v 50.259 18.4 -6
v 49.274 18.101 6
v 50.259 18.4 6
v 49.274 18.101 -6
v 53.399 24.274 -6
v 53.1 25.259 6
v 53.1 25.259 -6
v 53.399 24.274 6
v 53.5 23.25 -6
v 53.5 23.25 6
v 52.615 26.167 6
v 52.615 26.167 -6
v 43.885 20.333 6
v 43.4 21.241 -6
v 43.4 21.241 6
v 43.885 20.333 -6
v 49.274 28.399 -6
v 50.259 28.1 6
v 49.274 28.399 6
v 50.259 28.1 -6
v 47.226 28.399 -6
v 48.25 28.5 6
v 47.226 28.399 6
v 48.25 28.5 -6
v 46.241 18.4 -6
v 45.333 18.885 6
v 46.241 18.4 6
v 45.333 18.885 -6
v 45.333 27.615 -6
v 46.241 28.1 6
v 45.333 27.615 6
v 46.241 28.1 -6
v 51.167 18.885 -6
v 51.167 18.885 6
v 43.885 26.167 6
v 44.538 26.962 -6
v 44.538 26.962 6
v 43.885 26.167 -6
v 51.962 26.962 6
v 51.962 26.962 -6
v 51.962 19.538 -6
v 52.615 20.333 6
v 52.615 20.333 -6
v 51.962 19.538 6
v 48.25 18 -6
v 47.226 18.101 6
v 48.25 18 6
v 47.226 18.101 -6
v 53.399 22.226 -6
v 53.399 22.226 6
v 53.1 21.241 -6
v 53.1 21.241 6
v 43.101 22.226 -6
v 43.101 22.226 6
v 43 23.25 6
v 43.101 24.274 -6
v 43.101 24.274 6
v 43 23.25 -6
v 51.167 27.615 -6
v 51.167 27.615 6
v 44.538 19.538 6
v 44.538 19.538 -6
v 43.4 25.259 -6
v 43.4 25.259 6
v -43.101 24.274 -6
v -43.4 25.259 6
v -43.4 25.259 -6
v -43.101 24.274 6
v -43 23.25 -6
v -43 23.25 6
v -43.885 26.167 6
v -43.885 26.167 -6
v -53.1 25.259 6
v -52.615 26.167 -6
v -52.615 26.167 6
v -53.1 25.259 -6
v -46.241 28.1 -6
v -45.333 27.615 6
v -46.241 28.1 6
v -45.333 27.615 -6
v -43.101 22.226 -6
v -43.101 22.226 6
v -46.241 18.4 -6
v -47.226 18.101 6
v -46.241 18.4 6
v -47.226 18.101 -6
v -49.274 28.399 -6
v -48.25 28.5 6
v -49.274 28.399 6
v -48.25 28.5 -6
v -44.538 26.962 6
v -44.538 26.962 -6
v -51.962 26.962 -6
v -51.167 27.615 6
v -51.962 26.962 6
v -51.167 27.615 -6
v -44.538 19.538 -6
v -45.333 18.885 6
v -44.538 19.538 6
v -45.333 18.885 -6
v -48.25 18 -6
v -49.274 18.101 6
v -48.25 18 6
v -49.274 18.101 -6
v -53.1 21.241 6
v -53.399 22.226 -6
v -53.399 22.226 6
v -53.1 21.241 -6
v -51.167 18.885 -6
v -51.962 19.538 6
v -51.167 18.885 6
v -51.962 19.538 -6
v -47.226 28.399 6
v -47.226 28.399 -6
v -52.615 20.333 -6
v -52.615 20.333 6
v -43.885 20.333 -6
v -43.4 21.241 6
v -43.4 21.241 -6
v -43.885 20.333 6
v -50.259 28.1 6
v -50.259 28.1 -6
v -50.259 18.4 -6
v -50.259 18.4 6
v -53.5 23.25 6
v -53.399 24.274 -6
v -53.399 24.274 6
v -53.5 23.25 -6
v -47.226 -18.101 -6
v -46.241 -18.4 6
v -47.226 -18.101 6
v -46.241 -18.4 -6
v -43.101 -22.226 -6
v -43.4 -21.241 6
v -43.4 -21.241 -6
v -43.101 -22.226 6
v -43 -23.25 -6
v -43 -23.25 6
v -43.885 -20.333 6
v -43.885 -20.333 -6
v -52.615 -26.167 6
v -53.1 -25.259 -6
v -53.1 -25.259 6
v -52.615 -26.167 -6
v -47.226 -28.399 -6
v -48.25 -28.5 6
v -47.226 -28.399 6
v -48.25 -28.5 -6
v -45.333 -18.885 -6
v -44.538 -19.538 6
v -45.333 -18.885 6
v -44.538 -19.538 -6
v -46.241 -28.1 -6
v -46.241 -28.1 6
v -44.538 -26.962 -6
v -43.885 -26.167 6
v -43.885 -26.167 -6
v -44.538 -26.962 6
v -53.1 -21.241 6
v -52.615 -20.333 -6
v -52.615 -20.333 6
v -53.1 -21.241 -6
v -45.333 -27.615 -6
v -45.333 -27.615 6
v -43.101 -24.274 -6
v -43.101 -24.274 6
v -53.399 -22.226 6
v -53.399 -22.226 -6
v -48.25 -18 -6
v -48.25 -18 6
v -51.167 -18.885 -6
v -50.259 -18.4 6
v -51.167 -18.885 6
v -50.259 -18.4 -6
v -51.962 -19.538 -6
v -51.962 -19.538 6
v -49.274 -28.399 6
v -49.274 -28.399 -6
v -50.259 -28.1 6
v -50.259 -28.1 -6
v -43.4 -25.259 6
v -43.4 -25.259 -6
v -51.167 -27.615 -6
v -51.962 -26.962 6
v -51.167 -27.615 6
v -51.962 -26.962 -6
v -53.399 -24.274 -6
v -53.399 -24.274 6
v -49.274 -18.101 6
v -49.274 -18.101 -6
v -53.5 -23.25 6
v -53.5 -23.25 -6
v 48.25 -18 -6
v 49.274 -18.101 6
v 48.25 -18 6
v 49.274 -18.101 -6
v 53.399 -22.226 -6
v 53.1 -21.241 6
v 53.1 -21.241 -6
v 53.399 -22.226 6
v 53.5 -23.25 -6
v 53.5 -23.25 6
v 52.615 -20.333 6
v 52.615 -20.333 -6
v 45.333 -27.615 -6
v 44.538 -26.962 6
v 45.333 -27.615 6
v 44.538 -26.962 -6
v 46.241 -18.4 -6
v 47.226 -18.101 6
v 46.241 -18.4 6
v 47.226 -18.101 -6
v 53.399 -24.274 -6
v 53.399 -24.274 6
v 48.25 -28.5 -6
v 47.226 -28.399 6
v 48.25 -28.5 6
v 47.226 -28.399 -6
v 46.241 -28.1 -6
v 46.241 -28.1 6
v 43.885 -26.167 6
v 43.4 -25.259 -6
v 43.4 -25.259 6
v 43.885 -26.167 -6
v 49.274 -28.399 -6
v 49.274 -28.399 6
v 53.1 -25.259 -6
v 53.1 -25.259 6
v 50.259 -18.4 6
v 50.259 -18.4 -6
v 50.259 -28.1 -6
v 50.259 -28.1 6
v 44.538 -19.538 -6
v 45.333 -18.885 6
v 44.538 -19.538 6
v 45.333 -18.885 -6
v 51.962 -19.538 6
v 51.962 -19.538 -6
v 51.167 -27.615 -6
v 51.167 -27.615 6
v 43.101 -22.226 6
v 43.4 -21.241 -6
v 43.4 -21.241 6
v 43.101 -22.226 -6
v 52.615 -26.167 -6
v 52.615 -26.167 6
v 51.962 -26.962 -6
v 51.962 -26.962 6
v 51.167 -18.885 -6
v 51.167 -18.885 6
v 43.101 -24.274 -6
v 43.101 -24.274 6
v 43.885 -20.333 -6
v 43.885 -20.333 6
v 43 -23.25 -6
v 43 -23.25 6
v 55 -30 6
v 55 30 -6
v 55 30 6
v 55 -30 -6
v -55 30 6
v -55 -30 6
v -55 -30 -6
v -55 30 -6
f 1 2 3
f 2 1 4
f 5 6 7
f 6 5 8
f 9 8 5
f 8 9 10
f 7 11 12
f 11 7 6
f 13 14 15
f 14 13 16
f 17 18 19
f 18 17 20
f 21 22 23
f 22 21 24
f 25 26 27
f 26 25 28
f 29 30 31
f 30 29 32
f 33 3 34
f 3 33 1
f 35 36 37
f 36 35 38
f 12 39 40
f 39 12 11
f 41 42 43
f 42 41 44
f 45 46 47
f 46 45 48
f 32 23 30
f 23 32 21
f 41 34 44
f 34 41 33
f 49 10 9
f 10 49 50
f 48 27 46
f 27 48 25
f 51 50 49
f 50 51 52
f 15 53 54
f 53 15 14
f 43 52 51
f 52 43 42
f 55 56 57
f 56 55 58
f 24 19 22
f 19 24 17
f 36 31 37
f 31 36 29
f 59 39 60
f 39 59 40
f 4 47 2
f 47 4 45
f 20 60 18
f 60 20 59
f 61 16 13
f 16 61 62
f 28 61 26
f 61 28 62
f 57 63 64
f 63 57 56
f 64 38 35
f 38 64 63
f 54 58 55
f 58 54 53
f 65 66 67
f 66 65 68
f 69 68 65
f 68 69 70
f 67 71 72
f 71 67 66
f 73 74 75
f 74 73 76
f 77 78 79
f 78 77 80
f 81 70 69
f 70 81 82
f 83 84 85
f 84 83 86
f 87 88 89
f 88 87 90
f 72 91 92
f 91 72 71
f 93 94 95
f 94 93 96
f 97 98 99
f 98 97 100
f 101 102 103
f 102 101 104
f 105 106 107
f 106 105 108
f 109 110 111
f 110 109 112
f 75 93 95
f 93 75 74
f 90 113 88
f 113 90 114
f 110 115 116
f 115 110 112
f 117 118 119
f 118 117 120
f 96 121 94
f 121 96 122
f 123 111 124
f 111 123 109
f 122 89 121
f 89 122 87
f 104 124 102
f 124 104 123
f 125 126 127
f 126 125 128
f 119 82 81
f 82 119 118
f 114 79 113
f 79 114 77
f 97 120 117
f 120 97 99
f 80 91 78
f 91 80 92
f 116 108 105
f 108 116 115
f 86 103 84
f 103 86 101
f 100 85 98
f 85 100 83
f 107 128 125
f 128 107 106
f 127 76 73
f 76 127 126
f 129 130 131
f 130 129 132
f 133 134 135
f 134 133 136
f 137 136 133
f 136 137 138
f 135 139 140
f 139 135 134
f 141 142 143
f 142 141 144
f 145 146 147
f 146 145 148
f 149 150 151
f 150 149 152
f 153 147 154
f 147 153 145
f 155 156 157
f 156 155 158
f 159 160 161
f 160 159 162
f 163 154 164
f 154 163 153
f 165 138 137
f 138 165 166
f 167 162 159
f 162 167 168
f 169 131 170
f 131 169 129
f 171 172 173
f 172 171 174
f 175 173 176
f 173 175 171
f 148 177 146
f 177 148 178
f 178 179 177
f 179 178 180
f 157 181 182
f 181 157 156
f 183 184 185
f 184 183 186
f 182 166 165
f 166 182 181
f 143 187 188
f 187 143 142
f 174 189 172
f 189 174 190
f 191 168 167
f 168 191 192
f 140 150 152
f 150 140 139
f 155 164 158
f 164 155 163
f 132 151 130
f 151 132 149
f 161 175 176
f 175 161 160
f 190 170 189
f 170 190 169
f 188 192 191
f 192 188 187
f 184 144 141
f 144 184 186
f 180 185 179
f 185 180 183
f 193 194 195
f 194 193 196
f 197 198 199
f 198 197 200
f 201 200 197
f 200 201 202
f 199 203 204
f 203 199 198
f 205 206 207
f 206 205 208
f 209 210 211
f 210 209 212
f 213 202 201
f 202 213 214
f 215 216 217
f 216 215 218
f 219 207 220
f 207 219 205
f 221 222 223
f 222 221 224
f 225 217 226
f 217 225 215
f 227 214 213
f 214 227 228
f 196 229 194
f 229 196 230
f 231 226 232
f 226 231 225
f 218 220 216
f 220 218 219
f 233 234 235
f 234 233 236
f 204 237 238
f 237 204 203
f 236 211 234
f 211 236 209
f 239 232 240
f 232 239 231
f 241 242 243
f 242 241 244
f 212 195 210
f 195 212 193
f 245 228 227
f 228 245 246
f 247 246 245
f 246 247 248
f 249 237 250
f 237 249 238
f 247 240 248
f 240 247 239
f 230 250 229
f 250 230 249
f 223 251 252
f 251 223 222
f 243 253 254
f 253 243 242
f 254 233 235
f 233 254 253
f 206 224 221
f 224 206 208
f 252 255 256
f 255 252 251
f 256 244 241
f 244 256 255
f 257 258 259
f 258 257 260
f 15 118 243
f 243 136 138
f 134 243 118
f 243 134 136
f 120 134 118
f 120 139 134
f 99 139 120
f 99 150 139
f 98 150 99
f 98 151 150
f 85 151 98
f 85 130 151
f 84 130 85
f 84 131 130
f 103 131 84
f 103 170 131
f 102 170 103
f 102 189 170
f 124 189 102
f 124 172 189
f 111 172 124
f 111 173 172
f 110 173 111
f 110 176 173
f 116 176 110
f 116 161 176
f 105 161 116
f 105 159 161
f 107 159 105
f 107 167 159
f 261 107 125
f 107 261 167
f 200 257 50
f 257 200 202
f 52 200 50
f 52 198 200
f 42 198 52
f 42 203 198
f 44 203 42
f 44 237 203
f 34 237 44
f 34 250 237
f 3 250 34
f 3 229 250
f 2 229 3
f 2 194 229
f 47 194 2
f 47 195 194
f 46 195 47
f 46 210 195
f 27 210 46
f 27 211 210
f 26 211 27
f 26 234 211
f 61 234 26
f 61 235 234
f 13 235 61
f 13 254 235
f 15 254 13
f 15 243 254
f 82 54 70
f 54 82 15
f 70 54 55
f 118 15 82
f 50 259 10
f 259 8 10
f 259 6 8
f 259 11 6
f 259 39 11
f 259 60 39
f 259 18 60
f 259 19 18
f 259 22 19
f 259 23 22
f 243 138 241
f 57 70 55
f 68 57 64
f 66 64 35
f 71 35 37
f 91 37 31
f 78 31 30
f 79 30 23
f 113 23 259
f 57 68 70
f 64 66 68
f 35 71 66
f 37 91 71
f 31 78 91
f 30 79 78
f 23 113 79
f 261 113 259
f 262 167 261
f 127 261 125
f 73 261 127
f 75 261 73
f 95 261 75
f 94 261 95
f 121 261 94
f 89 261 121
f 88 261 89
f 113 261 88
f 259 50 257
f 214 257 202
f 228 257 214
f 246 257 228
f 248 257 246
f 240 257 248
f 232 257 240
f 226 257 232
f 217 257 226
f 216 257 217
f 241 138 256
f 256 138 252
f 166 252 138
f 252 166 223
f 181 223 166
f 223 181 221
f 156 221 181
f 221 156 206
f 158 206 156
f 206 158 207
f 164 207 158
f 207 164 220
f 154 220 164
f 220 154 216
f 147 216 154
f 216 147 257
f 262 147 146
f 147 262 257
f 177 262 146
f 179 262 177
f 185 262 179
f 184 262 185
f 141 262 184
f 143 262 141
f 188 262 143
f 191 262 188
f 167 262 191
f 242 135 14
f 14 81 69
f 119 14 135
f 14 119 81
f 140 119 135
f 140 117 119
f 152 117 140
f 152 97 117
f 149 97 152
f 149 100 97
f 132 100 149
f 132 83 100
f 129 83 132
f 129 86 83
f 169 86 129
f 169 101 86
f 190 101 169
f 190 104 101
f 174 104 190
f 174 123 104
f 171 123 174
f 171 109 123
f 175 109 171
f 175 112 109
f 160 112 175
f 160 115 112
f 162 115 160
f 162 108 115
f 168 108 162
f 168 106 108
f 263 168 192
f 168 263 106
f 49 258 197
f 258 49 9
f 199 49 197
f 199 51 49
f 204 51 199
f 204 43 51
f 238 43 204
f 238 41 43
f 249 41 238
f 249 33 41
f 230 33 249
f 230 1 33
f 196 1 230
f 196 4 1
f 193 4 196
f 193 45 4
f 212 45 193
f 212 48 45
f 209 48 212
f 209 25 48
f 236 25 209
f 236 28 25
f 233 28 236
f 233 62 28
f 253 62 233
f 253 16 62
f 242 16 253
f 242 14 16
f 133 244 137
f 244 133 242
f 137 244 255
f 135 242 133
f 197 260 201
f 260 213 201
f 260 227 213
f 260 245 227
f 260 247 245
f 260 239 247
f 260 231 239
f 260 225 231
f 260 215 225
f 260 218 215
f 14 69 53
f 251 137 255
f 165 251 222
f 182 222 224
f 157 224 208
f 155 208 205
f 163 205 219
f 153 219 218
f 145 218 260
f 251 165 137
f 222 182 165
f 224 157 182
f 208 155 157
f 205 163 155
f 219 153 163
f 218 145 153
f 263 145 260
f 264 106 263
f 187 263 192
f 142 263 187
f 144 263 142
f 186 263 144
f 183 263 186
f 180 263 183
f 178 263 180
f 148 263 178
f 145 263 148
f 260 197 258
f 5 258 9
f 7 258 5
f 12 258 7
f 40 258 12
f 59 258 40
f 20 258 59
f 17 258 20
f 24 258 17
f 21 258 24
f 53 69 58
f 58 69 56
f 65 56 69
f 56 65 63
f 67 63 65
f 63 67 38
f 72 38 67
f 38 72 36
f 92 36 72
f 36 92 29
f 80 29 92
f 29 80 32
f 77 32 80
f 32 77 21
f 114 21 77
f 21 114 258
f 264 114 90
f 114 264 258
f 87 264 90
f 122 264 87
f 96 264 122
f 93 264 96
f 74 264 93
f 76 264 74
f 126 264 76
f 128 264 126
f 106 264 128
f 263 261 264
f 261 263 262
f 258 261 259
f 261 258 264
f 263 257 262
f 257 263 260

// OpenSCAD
$fn = 32;

// ----------------------------------------------------------------------
// Corner plate 110 x 60 x 12
// 4 holes, centres taken from the edge offset
// ----------------------------------------------------------------------

// --- parameters (mm) ---
plate = [110, 60, 12];  // overall size (x, y, z)
holes = 4;              // number of holes the drawing asks for
hole_d = 10.5;          // hole diameter
edge = 6.75;            // hole centre offset from the plate edge

// --- derived feature positions (mm) ---
corner_x = plate[0] / 2 - edge;  // = 48.25   corner hole X
corner_y = plate[1] / 2 - edge;  // = 23.25   corner hole Y
feature_centers = [
  [corner_x, corner_y],
  [-corner_x, corner_y],
  [-corner_x, -corner_y],
  [corner_x, -corner_y]
];   // hole centres the loop below drills

// plate outline, every hole drilled through with the same cutters
difference() {
  cube(plate, center = true);
  for (centre = feature_centers)
    translate([centre[0], centre[1], 0])
      cylinder(d = hole_d, h = plate[2] + 2, center = true);
}
